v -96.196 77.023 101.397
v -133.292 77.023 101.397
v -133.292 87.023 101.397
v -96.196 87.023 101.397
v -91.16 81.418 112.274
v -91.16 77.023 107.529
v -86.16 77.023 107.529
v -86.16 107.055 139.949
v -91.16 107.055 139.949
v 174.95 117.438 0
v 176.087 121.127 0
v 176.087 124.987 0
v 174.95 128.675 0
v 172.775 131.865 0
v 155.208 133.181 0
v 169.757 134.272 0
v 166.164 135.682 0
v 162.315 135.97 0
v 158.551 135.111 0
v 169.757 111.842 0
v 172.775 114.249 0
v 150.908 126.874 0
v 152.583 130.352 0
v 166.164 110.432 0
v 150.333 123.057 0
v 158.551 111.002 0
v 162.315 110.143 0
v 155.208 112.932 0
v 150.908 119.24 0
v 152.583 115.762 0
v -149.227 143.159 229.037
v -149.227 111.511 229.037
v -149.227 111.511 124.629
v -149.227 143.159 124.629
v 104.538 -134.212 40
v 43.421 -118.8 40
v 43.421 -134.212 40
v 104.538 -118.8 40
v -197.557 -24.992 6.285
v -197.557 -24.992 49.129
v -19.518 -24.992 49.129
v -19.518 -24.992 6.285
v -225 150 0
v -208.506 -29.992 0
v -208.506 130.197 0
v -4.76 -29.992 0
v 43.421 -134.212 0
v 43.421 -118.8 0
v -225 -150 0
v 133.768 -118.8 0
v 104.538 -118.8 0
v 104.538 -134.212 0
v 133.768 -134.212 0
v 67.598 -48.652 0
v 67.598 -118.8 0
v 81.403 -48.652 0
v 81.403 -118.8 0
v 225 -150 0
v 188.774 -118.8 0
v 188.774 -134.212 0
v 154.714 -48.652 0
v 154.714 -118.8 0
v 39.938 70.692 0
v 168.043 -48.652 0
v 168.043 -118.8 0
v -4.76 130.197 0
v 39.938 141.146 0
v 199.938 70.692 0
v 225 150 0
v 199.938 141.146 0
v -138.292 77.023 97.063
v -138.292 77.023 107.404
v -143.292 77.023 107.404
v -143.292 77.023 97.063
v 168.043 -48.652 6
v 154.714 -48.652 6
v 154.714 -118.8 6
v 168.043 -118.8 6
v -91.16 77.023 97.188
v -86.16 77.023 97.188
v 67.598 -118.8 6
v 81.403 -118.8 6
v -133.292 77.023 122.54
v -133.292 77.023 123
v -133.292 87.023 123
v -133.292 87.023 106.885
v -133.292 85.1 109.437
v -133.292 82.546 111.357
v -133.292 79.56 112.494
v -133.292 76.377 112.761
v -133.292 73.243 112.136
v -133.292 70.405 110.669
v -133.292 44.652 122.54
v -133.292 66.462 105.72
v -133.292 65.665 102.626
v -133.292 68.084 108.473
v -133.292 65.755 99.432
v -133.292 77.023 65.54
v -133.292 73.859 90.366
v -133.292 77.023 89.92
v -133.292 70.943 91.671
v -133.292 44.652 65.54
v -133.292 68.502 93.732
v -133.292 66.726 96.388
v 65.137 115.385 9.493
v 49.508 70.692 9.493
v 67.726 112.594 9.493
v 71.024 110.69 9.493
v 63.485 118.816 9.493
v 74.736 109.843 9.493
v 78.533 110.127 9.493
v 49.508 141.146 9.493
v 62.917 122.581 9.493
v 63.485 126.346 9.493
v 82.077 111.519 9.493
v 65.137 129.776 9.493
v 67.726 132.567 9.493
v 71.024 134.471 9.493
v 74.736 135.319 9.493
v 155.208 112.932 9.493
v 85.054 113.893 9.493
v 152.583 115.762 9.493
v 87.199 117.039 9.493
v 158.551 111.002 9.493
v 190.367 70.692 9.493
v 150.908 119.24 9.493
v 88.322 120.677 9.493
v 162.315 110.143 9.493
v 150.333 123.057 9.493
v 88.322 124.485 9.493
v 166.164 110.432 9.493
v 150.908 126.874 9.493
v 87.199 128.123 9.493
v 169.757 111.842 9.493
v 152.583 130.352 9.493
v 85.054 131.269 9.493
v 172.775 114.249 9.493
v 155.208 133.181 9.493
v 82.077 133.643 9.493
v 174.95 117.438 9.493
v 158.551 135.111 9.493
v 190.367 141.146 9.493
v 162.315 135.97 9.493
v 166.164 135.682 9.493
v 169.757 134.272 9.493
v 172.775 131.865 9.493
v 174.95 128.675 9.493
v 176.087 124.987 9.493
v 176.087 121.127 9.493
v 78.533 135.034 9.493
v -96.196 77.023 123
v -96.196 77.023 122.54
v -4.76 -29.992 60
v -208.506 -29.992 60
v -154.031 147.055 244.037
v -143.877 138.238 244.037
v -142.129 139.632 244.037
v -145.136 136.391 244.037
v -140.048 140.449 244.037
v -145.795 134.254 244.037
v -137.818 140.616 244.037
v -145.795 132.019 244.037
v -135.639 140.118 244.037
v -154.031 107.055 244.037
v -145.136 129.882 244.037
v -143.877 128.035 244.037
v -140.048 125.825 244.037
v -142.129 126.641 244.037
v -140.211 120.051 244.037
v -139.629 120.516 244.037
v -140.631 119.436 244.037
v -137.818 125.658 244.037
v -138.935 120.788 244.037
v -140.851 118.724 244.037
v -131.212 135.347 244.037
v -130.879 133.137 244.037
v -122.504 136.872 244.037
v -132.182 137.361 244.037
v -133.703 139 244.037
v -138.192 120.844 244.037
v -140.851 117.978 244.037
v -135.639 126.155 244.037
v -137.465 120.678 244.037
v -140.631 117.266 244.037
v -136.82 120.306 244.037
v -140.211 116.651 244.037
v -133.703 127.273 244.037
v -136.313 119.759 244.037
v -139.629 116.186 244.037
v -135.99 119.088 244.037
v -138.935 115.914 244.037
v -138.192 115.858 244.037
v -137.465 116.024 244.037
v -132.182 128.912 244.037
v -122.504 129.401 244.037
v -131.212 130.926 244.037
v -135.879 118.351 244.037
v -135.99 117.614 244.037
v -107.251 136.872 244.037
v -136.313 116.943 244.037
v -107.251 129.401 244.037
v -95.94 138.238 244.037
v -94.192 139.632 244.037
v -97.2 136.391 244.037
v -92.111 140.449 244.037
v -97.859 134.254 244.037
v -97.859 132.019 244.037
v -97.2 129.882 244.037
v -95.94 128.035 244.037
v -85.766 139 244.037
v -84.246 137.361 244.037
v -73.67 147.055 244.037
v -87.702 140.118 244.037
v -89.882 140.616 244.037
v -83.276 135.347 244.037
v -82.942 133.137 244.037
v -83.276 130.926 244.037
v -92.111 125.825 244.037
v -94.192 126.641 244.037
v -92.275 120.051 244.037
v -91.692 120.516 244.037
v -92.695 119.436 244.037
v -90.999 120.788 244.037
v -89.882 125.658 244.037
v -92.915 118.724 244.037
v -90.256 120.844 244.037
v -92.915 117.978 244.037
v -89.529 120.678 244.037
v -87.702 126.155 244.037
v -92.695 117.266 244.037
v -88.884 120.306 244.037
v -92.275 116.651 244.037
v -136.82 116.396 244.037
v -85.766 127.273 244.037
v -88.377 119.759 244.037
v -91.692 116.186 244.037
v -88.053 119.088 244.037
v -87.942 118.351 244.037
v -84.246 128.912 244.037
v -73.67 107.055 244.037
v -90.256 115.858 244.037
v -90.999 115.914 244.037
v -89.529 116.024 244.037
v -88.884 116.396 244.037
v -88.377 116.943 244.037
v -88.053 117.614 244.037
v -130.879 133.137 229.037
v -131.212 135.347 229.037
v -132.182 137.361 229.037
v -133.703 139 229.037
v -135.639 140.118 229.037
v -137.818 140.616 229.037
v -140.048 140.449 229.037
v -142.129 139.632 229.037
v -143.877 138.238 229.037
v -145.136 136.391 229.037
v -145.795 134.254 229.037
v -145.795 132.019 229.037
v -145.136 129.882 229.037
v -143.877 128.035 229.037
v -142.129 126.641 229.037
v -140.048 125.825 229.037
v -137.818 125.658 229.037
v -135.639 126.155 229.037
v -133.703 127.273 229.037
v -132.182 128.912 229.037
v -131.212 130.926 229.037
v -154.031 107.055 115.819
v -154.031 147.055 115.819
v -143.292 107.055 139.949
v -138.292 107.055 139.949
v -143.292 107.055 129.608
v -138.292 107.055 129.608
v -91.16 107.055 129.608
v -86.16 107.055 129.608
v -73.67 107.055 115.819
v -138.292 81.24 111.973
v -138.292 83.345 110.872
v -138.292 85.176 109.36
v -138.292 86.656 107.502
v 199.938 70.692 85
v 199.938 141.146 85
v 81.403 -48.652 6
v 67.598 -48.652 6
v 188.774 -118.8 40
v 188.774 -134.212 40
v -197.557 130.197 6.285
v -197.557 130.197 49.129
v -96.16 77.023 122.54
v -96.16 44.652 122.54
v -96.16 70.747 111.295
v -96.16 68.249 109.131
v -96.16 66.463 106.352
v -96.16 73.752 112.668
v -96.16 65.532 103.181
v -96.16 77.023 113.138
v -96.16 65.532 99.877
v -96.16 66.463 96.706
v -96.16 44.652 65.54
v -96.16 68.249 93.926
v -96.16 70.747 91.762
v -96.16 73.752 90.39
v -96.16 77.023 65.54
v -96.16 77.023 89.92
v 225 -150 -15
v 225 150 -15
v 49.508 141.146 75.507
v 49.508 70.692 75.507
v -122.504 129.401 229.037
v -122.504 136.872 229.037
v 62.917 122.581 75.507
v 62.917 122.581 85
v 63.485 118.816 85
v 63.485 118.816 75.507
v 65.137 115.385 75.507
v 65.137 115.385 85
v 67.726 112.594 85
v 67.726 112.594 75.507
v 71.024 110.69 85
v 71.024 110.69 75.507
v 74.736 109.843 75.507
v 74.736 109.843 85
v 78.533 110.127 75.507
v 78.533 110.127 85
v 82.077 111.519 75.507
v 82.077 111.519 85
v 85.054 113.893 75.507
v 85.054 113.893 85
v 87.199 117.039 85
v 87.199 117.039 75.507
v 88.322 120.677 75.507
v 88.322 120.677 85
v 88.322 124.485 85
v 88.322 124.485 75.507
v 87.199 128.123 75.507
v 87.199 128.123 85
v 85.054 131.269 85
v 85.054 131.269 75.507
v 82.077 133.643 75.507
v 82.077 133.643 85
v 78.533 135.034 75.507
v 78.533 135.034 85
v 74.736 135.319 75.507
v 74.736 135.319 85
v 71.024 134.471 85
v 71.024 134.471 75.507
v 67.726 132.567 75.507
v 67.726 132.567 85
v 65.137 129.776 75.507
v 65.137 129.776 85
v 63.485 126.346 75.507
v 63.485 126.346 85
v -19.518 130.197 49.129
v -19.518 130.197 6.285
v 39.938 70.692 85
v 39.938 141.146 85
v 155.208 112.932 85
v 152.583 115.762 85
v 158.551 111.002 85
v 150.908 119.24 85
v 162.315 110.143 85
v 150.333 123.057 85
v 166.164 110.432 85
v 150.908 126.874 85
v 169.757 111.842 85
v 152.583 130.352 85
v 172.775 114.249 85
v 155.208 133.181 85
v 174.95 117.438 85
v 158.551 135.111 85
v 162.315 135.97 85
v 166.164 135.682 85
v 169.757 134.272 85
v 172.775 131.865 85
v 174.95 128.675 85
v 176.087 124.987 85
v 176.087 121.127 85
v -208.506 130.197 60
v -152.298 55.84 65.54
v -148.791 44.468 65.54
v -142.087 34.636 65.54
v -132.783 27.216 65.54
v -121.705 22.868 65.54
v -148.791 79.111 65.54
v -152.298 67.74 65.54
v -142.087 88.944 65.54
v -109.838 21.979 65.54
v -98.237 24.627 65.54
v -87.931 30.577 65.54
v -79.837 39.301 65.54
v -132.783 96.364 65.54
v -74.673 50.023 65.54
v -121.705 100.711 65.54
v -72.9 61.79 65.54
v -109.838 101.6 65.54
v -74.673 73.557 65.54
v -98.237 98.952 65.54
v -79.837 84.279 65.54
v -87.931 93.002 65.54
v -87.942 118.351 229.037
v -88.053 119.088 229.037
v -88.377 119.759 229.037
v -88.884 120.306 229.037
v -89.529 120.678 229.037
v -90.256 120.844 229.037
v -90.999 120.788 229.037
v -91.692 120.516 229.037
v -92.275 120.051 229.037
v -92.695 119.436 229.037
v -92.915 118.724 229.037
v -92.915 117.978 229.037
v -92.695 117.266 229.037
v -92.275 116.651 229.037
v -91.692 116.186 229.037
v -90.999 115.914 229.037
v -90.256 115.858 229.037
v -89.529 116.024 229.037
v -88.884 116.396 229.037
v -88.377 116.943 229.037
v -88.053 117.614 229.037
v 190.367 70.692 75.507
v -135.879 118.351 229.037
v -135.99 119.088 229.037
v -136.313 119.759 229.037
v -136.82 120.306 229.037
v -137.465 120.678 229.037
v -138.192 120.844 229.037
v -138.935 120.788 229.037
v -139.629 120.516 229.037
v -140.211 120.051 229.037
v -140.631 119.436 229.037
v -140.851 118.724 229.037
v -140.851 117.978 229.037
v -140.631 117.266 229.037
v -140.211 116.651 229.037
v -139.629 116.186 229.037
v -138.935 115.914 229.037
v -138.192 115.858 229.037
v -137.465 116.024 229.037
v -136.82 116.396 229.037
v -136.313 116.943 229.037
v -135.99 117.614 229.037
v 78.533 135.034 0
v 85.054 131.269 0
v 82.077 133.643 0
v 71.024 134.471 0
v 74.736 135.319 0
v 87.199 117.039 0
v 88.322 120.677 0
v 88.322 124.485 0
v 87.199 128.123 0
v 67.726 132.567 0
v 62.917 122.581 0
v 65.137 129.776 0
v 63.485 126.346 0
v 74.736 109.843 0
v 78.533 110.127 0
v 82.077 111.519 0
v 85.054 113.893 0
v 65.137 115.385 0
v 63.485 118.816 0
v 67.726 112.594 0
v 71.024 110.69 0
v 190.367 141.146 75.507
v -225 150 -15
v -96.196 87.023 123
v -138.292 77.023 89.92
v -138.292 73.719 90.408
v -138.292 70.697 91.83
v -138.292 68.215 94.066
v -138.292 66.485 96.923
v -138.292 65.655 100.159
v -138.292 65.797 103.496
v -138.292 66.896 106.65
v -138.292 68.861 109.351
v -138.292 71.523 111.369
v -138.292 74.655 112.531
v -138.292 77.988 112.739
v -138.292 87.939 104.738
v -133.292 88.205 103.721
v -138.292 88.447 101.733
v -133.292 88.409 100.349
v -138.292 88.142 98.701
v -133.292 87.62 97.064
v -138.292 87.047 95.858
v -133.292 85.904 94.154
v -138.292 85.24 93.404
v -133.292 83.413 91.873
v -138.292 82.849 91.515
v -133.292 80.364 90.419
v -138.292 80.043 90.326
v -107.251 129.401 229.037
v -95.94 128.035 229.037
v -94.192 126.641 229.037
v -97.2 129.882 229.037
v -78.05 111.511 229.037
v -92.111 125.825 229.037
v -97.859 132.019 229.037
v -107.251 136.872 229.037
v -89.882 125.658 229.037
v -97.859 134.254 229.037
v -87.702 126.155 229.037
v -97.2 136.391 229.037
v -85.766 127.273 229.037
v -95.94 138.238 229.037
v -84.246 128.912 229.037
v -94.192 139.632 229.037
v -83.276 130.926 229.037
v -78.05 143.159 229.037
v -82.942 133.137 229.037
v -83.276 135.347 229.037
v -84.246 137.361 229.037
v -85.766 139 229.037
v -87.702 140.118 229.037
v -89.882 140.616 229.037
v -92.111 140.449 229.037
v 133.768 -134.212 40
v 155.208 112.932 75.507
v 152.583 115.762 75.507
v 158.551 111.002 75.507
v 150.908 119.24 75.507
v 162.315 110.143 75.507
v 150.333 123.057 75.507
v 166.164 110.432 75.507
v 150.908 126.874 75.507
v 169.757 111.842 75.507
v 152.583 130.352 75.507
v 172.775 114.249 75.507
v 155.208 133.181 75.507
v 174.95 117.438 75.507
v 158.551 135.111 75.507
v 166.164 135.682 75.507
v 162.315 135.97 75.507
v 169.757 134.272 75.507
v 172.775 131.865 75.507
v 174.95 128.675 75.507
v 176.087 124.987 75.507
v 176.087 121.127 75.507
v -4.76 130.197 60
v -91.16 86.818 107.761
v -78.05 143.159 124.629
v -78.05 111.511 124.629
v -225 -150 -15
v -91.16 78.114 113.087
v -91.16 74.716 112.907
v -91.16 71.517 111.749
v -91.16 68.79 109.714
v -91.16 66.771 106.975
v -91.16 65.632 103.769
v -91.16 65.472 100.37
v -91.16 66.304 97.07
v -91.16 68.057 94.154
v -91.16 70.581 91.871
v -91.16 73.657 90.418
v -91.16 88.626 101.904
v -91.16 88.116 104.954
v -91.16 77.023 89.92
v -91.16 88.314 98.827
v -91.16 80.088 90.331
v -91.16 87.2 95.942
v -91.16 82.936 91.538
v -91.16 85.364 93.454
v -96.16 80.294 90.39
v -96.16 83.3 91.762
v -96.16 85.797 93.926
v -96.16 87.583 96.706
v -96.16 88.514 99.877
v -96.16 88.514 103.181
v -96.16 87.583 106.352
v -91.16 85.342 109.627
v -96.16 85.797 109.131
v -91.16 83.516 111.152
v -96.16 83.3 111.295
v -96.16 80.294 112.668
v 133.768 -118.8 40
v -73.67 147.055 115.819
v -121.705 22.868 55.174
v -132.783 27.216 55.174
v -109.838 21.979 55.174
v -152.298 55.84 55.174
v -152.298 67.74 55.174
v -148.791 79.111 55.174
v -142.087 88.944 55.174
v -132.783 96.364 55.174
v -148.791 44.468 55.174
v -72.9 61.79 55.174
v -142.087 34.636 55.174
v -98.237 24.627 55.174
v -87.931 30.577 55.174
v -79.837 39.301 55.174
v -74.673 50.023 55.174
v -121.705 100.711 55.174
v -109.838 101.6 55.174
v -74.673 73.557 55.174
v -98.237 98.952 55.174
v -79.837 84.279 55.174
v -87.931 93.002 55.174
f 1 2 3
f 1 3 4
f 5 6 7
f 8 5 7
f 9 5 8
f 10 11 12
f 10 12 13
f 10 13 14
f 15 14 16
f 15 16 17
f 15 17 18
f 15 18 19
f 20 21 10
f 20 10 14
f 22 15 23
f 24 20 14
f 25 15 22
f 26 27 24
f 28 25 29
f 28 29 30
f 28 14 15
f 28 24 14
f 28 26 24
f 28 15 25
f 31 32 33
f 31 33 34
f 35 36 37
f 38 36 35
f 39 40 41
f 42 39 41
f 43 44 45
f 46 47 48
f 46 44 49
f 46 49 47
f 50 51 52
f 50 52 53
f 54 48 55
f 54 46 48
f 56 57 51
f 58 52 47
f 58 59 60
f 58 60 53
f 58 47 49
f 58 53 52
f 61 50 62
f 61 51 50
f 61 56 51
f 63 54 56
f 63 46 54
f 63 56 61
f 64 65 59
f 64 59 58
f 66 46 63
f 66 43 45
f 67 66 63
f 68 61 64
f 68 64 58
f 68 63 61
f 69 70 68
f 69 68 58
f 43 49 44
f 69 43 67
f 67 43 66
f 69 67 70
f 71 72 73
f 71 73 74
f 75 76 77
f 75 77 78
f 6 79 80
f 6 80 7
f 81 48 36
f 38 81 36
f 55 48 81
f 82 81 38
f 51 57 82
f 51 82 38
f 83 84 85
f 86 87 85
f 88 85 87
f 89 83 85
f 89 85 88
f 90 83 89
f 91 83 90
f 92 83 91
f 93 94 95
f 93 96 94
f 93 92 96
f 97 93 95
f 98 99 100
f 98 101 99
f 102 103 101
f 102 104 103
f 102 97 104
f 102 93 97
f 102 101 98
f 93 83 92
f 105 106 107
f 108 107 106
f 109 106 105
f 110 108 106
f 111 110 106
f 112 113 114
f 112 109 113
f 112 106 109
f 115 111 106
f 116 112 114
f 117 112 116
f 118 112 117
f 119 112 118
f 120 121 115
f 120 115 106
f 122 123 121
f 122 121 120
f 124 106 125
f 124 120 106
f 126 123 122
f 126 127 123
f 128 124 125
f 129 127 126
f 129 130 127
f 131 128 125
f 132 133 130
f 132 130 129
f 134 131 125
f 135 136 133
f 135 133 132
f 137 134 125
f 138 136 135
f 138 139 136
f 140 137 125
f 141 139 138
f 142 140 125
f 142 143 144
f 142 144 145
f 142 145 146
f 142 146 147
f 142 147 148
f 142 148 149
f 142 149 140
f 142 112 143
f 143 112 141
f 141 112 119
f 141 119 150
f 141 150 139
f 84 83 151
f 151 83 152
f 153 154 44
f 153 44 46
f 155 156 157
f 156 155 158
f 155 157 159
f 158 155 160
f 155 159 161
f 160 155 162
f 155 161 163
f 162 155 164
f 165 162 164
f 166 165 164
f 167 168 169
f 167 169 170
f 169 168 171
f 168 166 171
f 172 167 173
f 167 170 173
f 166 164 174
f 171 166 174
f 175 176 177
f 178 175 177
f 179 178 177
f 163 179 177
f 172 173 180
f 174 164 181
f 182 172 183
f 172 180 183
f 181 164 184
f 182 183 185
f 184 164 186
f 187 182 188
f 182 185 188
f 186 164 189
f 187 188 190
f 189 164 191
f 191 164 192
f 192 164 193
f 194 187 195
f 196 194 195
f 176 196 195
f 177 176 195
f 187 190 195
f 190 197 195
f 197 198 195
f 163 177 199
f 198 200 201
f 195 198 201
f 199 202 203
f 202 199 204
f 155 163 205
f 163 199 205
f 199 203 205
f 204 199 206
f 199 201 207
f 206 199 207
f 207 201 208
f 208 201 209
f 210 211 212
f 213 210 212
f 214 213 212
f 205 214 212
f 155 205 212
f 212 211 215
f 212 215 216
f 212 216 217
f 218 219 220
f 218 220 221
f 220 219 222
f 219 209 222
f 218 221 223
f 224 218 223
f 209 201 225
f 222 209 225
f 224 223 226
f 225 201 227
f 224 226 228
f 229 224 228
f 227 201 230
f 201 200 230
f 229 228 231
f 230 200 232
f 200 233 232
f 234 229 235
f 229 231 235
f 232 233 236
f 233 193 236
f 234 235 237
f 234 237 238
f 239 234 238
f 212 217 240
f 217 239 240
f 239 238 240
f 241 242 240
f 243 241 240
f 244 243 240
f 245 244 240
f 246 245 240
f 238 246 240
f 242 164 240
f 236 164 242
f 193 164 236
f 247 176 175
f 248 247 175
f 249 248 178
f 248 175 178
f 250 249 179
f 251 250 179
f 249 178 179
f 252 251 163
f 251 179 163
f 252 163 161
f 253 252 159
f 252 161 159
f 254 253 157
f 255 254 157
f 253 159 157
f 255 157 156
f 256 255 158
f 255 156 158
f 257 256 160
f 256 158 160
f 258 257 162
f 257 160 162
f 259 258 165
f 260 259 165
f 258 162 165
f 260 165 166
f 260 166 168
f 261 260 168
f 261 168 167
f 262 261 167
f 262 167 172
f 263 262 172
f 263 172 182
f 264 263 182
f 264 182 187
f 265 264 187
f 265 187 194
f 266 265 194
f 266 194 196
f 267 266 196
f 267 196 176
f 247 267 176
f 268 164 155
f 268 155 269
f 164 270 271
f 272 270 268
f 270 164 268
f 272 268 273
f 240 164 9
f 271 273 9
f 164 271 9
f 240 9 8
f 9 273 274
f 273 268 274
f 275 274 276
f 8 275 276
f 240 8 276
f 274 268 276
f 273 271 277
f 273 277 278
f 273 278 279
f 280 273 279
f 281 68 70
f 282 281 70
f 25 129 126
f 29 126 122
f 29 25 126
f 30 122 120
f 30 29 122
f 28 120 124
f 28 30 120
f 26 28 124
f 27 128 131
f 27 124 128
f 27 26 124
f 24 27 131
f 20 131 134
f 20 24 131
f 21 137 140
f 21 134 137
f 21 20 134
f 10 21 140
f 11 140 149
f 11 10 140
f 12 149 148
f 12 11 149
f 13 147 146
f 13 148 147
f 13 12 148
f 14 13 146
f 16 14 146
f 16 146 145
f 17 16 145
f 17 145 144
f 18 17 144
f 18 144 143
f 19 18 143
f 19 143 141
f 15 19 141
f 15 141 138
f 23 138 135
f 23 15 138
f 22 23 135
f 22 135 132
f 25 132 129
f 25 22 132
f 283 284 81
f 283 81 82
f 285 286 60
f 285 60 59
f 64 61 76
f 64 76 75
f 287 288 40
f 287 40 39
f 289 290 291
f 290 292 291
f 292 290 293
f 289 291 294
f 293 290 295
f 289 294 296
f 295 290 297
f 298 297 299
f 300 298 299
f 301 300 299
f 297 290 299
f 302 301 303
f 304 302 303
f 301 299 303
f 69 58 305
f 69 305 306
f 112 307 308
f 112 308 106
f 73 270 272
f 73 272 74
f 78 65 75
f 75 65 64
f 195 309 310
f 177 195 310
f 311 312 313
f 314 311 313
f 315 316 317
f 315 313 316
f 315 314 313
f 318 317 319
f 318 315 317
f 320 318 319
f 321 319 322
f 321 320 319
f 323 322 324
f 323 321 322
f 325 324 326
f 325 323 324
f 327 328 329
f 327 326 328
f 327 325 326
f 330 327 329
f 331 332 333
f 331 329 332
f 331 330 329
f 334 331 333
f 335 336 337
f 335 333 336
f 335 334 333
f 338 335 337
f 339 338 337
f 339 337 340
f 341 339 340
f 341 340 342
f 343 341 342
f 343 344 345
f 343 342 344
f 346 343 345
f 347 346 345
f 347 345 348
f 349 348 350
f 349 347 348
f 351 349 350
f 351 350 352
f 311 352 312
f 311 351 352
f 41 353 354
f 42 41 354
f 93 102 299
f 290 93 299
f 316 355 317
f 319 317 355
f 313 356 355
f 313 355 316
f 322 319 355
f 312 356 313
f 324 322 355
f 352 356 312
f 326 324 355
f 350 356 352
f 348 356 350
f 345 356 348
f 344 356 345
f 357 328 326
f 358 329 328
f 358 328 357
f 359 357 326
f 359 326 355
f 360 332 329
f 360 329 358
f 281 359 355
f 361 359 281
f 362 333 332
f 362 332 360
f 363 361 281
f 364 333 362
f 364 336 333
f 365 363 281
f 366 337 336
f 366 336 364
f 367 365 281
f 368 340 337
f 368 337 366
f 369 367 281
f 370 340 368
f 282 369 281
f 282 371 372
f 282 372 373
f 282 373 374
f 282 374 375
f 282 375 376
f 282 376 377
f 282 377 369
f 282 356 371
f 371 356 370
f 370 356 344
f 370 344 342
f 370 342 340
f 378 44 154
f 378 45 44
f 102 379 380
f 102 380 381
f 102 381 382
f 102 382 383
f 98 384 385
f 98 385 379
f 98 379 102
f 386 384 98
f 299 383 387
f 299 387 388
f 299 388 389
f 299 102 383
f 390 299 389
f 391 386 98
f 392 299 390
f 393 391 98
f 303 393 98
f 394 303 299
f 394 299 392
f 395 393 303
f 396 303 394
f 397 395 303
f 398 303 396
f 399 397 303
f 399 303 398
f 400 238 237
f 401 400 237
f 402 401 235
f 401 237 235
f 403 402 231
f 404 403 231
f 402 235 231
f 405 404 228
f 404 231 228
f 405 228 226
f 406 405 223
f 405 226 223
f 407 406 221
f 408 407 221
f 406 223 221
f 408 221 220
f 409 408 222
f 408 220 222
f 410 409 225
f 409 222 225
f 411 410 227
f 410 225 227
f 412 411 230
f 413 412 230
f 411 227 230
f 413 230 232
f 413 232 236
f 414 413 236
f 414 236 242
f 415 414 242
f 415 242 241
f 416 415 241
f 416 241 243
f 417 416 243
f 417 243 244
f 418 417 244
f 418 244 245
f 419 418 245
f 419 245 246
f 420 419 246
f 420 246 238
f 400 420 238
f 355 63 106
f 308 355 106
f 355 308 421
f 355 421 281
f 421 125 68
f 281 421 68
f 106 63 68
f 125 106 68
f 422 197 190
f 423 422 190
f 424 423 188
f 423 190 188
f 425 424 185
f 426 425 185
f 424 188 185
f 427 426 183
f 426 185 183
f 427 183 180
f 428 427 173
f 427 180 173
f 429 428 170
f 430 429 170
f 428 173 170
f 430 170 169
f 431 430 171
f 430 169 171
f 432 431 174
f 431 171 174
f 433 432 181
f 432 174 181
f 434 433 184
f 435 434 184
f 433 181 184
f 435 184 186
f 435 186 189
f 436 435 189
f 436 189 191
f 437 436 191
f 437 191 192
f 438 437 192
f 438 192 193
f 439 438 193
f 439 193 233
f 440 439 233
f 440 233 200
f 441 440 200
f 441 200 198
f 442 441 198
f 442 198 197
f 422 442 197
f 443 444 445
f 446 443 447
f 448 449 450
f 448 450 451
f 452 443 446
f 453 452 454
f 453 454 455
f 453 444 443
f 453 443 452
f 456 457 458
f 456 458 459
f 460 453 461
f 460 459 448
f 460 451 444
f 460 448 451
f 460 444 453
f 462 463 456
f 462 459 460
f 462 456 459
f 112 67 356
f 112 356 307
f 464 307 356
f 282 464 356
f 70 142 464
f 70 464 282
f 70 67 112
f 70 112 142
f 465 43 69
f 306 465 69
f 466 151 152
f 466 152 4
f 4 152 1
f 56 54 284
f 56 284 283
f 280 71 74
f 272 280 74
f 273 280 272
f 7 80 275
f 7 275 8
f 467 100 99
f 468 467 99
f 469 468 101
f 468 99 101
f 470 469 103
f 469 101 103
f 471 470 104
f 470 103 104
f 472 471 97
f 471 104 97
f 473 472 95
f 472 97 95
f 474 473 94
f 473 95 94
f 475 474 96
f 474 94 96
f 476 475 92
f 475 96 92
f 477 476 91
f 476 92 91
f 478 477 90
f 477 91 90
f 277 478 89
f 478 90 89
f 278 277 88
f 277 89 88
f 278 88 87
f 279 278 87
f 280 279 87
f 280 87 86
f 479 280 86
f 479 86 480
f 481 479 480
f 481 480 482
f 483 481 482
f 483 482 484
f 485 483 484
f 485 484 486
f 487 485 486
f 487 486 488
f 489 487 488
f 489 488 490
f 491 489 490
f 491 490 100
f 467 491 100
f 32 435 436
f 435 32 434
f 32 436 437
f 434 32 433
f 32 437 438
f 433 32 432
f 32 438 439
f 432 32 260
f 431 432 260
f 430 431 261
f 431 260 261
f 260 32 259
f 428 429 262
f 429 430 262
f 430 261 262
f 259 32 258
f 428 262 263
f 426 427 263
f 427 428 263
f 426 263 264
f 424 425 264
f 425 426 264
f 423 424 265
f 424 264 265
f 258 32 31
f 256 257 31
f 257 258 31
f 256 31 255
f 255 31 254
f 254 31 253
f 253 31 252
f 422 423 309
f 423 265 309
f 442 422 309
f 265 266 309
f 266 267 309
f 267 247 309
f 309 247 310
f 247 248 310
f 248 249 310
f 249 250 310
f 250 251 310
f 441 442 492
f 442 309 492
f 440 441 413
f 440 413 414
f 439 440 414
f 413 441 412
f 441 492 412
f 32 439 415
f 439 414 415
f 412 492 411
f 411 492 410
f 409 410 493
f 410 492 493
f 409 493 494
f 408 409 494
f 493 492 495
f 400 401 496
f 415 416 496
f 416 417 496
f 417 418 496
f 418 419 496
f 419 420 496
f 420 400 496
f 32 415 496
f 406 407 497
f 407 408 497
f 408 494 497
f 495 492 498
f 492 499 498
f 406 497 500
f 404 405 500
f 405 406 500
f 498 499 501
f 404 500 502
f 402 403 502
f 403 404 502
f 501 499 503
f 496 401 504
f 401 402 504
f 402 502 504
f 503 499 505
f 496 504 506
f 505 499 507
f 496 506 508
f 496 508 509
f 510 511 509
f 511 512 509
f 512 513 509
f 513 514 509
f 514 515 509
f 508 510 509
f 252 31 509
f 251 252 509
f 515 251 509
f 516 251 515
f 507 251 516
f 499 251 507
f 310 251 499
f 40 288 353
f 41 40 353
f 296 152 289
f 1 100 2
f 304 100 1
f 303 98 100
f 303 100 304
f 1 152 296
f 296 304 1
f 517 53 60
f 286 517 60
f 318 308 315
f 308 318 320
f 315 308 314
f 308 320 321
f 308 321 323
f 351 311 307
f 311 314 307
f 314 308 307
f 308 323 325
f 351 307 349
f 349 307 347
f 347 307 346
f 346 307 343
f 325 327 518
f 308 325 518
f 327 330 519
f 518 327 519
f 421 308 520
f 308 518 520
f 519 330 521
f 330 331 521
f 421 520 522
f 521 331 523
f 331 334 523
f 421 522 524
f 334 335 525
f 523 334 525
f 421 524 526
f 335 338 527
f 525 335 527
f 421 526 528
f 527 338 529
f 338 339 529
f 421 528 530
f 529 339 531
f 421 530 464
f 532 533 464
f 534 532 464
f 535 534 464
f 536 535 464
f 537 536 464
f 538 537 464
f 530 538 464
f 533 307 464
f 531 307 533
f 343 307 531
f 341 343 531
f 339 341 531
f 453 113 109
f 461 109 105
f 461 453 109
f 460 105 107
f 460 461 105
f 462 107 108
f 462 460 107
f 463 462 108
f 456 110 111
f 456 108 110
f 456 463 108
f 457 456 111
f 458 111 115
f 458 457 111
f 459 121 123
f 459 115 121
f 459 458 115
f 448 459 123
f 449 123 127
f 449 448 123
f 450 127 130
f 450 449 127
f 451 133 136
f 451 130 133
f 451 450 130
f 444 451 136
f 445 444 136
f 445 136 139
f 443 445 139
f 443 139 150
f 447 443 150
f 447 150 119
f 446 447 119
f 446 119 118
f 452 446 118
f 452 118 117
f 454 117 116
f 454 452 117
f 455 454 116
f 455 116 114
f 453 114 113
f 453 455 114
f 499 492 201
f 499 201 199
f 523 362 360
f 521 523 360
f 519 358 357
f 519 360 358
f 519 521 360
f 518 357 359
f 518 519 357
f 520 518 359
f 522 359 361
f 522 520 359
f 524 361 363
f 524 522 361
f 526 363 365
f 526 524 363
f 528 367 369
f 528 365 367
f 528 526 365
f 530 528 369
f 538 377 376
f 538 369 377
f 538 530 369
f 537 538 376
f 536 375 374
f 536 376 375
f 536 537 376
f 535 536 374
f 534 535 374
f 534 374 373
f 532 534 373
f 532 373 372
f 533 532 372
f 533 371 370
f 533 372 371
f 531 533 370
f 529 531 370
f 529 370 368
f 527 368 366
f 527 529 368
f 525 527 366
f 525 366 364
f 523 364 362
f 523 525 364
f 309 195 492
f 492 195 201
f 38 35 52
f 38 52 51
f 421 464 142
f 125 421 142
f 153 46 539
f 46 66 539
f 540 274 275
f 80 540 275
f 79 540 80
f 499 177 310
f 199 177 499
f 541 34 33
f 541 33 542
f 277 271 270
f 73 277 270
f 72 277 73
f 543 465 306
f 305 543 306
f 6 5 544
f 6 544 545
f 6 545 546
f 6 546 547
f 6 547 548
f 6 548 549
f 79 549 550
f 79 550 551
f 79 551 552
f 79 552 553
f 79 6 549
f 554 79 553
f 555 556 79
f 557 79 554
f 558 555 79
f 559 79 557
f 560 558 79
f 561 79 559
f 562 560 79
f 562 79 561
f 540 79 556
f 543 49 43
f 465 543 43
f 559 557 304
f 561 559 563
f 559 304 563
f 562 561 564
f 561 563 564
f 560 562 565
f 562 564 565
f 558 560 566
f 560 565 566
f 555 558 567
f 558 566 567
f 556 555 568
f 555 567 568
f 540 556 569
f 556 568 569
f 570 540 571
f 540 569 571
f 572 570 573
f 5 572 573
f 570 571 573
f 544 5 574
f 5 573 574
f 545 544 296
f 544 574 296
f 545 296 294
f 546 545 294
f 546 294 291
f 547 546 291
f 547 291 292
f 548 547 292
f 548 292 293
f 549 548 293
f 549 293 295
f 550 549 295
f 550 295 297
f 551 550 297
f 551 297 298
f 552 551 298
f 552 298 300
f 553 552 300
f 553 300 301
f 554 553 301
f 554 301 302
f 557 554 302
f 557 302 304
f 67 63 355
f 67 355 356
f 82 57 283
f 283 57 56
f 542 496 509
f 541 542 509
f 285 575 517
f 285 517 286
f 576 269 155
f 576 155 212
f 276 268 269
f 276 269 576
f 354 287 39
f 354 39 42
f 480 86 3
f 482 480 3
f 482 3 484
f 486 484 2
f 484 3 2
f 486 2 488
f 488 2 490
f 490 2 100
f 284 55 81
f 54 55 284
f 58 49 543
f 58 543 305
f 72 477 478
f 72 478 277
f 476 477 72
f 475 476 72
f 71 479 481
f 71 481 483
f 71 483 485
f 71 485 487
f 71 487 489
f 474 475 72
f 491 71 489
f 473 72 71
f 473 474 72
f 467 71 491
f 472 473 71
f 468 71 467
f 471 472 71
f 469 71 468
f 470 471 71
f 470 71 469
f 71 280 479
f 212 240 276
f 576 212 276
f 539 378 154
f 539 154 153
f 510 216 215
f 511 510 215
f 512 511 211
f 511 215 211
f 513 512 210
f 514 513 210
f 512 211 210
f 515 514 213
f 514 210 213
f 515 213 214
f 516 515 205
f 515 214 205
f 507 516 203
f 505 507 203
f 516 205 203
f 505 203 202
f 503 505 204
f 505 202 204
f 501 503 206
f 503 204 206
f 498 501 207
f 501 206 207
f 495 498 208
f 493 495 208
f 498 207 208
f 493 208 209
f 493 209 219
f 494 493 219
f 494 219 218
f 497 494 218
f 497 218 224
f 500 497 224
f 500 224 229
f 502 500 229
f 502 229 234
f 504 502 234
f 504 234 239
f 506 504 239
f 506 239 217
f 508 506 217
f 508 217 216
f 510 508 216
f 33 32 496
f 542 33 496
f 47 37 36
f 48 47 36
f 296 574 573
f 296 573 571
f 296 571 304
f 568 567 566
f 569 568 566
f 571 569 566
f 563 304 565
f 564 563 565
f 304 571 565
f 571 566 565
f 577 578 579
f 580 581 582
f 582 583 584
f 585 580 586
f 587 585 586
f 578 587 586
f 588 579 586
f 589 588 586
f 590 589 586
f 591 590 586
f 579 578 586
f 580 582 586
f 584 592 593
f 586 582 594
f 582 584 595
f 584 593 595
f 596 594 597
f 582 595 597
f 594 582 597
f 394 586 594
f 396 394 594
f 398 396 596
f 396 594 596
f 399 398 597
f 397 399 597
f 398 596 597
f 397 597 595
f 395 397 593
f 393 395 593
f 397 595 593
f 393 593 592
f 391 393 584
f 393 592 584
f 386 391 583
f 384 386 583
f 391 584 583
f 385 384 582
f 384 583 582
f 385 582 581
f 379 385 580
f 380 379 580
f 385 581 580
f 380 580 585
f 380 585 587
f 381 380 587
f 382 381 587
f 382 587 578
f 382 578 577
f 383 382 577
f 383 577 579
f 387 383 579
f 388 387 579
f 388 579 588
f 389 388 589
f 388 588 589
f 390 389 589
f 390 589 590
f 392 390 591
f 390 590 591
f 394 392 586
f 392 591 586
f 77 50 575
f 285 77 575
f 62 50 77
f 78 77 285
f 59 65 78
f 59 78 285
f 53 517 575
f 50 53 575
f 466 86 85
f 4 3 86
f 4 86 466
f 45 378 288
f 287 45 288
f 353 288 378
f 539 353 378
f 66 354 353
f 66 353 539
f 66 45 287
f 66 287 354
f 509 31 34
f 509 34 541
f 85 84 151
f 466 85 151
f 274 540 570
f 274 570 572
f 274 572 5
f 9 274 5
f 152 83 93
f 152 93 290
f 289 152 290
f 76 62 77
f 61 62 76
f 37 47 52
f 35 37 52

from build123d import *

# Parameters (mm, degrees)
SKETCH2_W                = 450
SKETCH2_H                = 300
BOSS_EXTRUDE1_DEPTH      = 15
SKETCH3_W                = 160
SKETCH3_H                = 70.454173546
BOSS_EXTRUDE2_DEPTH      = 85
SKETCH4_W                = 140.858362714
SKETCH4_H                = 66.01437432
CUT_EXTRUDE1_DEPTH       = 85
SKETCH6_W                = 203.74585323
SKETCH6_H                = 155.189598489
BOSS_EXTRUDE3_DEPTH      = 60
SKETCH7_W                = 178.03960072
SKETCH7_H                = 42.843754184
CUT_EXTRUDE2_DEPTH       = 370.270345082
SKETCH9_R                = 12.773539569
CUT_EXTRUDE3_DEPTH       = 284.460755661
SKETCH10_R               = 12.949734645
CUT_EXTRUDE4_DEPTH       = 284.460755661
SKETCH11_W               = 203.74585323
SKETCH11_H               = 60
BOSS_EXTRUDE4_DEPTH      = 5
SKETCH14_W               = 13.805209682
SKETCH14_H               = 70.454173547
SKETCH14_W_2             = 13.329167969
BOSS_EXTRUDE7_DEPTH      = 6
SKETCH15_W               = 55.005442473
SKETCH15_H               = 15.412152964
SKETCH15_W_2             = 61.117158303
BOSS_EXTRUDE8_DEPTH      = 40
BOSS_EXTRUDE9_DEPTH      = 3
BOSS_EXTRUDE9_DEPTH_BACK = 7.366
SKETCH17_R               = 39.922278331
SKETCH18_W               = 37.131253626
SKETCH18_H               = 32.370836495
BOSS_EXTRUDE10_DEPTH     = 60
SKETCH22_W               = 37.095971173
SKETCH22_H               = 21.602627686
BOSS_EXTRUDE11_DEPTH     = 10
SKETCH23_R               = 11.43
BOSS_EXTRUDE12_DEPTH     = 5
SKETCH24_R               = 11.609284077
BOSS_EXTRUDE13_DEPTH     = 5
BOSS_EXTRUDE14_DEPTH     = 5
BOSS_EXTRUDE15_DEPTH     = 5
SKETCH30_W               = 80.360367193
SKETCH30_H               = 128.21784224
BOSS_EXTRUDE17_DEPTH     = 40
SKETCH35_W               = 71.177586029
SKETCH35_H               = 31.648835894
CUT_EXTRUDE6_DEPTH       = 119.408
SKETCH39_W               = 80.360367193
SKETCH39_H               = 40
BOSS_EXTRUDE19_DEPTH     = 15
SKETCH38_R               = 7.5
SKETCH38_R_2             = 2.5
SKETCH38_W               = 15.252451033
SKETCH38_H               = 7.470588261
CUT_EXTRUDE7_DEPTH       = 20


with BuildPart() as part:
    # Sketch2 → Boss-Extrude1 (new body)
    with BuildSketch(Plane.XY):
        Rectangle(SKETCH2_W, SKETCH2_H)
    extrude(amount=-BOSS_EXTRUDE1_DEPTH)

    # Sketch3 → Boss-Extrude2 (add)
    with BuildSketch(Plane.XY):
        with Locations((119.937519525, 105.919281177)):
            Rectangle(SKETCH3_W, SKETCH3_H)
    extrude(amount=BOSS_EXTRUDE2_DEPTH)

    # Sketch4 → Cut-Extrude1 (cut)
    with BuildSketch(Plane(origin=(0, 141.14636795, 0), x_dir=(1, 0, 0), z_dir=(0, 1, 0))):
        with Locations((119.937519525, -42.5)):
            Rectangle(SKETCH4_W, SKETCH4_H)
    extrude(amount=-CUT_EXTRUDE1_DEPTH, mode=Mode.SUBTRACT)

    # Sketch6 → Boss-Extrude3 (add)
    with BuildSketch(Plane.XY):
        with Locations((-106.633343747, 52.602609303)):
            Rectangle(SKETCH6_W, SKETCH6_H)
    extrude(amount=BOSS_EXTRUDE3_DEPTH)

    # Sketch7 → Cut-Extrude2 (cut, through all)
    with BuildSketch(Plane(origin=(0, 130.197408548, 0), x_dir=(1, 0, 0), z_dir=(0, 1, 0))):
        with Locations((-108.537510599, -27.706846098)):
            Rectangle(SKETCH7_W, SKETCH7_H)
    extrude(amount=-CUT_EXTRUDE2_DEPTH, mode=Mode.SUBTRACT)

    # Sketch9 → Cut-Extrude3 (cut, through all)
    with BuildSketch(Plane.XY):
        with Locations(Location((75.690632392, 122.580741137, 0), (0, 0, 180))):
            Circle(SKETCH9_R)
    extrude(amount=CUT_EXTRUDE3_DEPTH, mode=Mode.SUBTRACT)

    # Sketch10 → Cut-Extrude4 (cut, through all)
    with BuildSketch(Plane.XY):
        with Locations(Location((163.282307612, 123.056782851, 0), (0, 0, 180))):
            Circle(SKETCH10_R)
    extrude(amount=CUT_EXTRUDE4_DEPTH, mode=Mode.SUBTRACT)

    # Sketch11 → Boss-Extrude4 (add)
    with BuildSketch(Plane.XZ.offset(24.992189941)):
        with Locations((-106.633343747, 30)):
            Rectangle(SKETCH11_W, SKETCH11_H)
    extrude(amount=BOSS_EXTRUDE4_DEPTH)

    # Sketch14 → Boss-Extrude7 (add)
    with BuildSketch(Plane.XY):
        with Locations((74.500528109, -83.878921765)):
            Rectangle(SKETCH14_W, SKETCH14_H)
        with Locations((161.37814076, -83.878921765)):
            Rectangle(SKETCH14_W_2, SKETCH14_H)
    extrude(amount=BOSS_EXTRUDE7_DEPTH)

    # Sketch15 → Boss-Extrude8 (add)
    with BuildSketch(Plane.XY):
        with Locations((161.271113451, -126.506349237)):
            Rectangle(SKETCH15_W, SKETCH15_H)
        with Locations((73.979867787, -126.506349237)):
            Rectangle(SKETCH15_W_2, SKETCH15_H)
    extrude(amount=BOSS_EXTRUDE8_DEPTH)


with BuildPart() as body_2:
    # Sketch17 → Boss-Extrude9 (new, two sides: drawn at the far end of the back side and taken through both)
    with BuildSketch(Plane.XY.offset(62.54).offset(-BOSS_EXTRUDE9_DEPTH_BACK)):
        with Locations((-112.821886018, 61.78984246)):
            Circle(SKETCH17_R)
    extrude(amount=BOSS_EXTRUDE9_DEPTH + BOSS_EXTRUDE9_DEPTH_BACK)

    # Sketch18 → Boss-Extrude10 (add)
    with BuildSketch(Plane.XY.offset(62.54)):
        with Locations((-114.72605287, 60.837759034)):
            Rectangle(SKETCH18_W, SKETCH18_H)
    extrude(amount=BOSS_EXTRUDE10_DEPTH)

    # Sketch22 → Boss-Extrude11 (add)
    with BuildSketch(Plane(origin=(0, 77.023177281, 0), x_dir=(1, 0, 0), z_dir=(0, 1, 0))):
        with Locations((-114.743694097, -112.198686157)):
            Rectangle(SKETCH22_W, SKETCH22_H)
    extrude(amount=BOSS_EXTRUDE11_DEPTH)

    # Sketch23 → Boss-Extrude12 (add)
    with BuildSketch(Plane.ZY.offset(133.291679683)):
        with Locations(Location((101.349549357, 77.023177281, 0), (0, 0, 180))):
            Circle(SKETCH23_R)
    extrude(amount=BOSS_EXTRUDE12_DEPTH)

    # Sketch24 → Boss-Extrude13 (add)
    with BuildSketch(Plane(origin=(-96.160426057, 0, 0), x_dir=(0, 0, -1), z_dir=(1, 0, 0))):
        with Locations((-101.528833434, 77.023177281)):
            Circle(SKETCH24_R)
    extrude(amount=BOSS_EXTRUDE13_DEPTH)

    # Sketch25 → Boss-Extrude14 (add)
    with BuildSketch(Plane(origin=(-91.160426057, 0, 0), x_dir=(0, 0, -1), z_dir=(1, 0, 0))):
        Polygon((-97.188050001, 77.023177281), (-107.529010443, 77.023177281), (-139.949318856, 107.054942489), (-129.608358414, 107.054942489), align=None)
    extrude(amount=BOSS_EXTRUDE14_DEPTH)

    # Sketch26 → Boss-Extrude15 (add)
    with BuildSketch(Plane.ZY.offset(138.291679683)):
        Polygon((129.608358414, 107.054942489), (139.949318856, 107.054942489), (107.403918576, 77.023177281), (97.062958134, 77.023177281), align=None)
    extrude(amount=BOSS_EXTRUDE15_DEPTH)

    # Sketch30 → Boss-Extrude17 (add)
    with BuildSketch(Plane(origin=(0, 107.054942489, 0), x_dir=(1, 0, 0), z_dir=(0, 1, 0))):
        with Locations((-113.850415669, -179.928026333)):
            Rectangle(SKETCH30_W, SKETCH30_H)
    extrude(amount=BOSS_EXTRUDE17_DEPTH)

    # Sketch35 → Cut-Extrude6 (cut)
    with BuildSketch(Plane.XY.offset(244.036947453)):
        with Locations((-113.638642199, 127.334985672)):
            Rectangle(SKETCH35_W, SKETCH35_H)
    extrude(amount=-CUT_EXTRUDE6_DEPTH, mode=Mode.SUBTRACT)

    # Sketch39 → Boss-Extrude19 (add)
    with BuildSketch(Plane.XY.offset(244.036947453)):
        with Locations((-113.850415669, 127.054942489)):
            Rectangle(SKETCH39_W, SKETCH39_H)
    extrude(amount=-BOSS_EXTRUDE19_DEPTH)

    # Sketch38 → Cut-Extrude7 (cut)
    with BuildSketch(Plane.XY.offset(244.036947453)):
        with Locations((-138.378706494, 133.13656573)):
            Circle(SKETCH38_R)
        with Locations((-138.378706494, 118.351026463)):
            Circle(SKETCH38_R_2)
        with Locations((-90.442431819, 133.13656573)):
            Circle(SKETCH38_R)
        with Locations((-90.442431819, 118.351026463)):
            Circle(SKETCH38_R_2)
        with Locations((-114.877480923, 133.13656573)):
            Rectangle(SKETCH38_W, SKETCH38_H)
    extrude(amount=-CUT_EXTRUDE7_DEPTH, mode=Mode.SUBTRACT)


solid = Compound([part.part, body_2.part])
